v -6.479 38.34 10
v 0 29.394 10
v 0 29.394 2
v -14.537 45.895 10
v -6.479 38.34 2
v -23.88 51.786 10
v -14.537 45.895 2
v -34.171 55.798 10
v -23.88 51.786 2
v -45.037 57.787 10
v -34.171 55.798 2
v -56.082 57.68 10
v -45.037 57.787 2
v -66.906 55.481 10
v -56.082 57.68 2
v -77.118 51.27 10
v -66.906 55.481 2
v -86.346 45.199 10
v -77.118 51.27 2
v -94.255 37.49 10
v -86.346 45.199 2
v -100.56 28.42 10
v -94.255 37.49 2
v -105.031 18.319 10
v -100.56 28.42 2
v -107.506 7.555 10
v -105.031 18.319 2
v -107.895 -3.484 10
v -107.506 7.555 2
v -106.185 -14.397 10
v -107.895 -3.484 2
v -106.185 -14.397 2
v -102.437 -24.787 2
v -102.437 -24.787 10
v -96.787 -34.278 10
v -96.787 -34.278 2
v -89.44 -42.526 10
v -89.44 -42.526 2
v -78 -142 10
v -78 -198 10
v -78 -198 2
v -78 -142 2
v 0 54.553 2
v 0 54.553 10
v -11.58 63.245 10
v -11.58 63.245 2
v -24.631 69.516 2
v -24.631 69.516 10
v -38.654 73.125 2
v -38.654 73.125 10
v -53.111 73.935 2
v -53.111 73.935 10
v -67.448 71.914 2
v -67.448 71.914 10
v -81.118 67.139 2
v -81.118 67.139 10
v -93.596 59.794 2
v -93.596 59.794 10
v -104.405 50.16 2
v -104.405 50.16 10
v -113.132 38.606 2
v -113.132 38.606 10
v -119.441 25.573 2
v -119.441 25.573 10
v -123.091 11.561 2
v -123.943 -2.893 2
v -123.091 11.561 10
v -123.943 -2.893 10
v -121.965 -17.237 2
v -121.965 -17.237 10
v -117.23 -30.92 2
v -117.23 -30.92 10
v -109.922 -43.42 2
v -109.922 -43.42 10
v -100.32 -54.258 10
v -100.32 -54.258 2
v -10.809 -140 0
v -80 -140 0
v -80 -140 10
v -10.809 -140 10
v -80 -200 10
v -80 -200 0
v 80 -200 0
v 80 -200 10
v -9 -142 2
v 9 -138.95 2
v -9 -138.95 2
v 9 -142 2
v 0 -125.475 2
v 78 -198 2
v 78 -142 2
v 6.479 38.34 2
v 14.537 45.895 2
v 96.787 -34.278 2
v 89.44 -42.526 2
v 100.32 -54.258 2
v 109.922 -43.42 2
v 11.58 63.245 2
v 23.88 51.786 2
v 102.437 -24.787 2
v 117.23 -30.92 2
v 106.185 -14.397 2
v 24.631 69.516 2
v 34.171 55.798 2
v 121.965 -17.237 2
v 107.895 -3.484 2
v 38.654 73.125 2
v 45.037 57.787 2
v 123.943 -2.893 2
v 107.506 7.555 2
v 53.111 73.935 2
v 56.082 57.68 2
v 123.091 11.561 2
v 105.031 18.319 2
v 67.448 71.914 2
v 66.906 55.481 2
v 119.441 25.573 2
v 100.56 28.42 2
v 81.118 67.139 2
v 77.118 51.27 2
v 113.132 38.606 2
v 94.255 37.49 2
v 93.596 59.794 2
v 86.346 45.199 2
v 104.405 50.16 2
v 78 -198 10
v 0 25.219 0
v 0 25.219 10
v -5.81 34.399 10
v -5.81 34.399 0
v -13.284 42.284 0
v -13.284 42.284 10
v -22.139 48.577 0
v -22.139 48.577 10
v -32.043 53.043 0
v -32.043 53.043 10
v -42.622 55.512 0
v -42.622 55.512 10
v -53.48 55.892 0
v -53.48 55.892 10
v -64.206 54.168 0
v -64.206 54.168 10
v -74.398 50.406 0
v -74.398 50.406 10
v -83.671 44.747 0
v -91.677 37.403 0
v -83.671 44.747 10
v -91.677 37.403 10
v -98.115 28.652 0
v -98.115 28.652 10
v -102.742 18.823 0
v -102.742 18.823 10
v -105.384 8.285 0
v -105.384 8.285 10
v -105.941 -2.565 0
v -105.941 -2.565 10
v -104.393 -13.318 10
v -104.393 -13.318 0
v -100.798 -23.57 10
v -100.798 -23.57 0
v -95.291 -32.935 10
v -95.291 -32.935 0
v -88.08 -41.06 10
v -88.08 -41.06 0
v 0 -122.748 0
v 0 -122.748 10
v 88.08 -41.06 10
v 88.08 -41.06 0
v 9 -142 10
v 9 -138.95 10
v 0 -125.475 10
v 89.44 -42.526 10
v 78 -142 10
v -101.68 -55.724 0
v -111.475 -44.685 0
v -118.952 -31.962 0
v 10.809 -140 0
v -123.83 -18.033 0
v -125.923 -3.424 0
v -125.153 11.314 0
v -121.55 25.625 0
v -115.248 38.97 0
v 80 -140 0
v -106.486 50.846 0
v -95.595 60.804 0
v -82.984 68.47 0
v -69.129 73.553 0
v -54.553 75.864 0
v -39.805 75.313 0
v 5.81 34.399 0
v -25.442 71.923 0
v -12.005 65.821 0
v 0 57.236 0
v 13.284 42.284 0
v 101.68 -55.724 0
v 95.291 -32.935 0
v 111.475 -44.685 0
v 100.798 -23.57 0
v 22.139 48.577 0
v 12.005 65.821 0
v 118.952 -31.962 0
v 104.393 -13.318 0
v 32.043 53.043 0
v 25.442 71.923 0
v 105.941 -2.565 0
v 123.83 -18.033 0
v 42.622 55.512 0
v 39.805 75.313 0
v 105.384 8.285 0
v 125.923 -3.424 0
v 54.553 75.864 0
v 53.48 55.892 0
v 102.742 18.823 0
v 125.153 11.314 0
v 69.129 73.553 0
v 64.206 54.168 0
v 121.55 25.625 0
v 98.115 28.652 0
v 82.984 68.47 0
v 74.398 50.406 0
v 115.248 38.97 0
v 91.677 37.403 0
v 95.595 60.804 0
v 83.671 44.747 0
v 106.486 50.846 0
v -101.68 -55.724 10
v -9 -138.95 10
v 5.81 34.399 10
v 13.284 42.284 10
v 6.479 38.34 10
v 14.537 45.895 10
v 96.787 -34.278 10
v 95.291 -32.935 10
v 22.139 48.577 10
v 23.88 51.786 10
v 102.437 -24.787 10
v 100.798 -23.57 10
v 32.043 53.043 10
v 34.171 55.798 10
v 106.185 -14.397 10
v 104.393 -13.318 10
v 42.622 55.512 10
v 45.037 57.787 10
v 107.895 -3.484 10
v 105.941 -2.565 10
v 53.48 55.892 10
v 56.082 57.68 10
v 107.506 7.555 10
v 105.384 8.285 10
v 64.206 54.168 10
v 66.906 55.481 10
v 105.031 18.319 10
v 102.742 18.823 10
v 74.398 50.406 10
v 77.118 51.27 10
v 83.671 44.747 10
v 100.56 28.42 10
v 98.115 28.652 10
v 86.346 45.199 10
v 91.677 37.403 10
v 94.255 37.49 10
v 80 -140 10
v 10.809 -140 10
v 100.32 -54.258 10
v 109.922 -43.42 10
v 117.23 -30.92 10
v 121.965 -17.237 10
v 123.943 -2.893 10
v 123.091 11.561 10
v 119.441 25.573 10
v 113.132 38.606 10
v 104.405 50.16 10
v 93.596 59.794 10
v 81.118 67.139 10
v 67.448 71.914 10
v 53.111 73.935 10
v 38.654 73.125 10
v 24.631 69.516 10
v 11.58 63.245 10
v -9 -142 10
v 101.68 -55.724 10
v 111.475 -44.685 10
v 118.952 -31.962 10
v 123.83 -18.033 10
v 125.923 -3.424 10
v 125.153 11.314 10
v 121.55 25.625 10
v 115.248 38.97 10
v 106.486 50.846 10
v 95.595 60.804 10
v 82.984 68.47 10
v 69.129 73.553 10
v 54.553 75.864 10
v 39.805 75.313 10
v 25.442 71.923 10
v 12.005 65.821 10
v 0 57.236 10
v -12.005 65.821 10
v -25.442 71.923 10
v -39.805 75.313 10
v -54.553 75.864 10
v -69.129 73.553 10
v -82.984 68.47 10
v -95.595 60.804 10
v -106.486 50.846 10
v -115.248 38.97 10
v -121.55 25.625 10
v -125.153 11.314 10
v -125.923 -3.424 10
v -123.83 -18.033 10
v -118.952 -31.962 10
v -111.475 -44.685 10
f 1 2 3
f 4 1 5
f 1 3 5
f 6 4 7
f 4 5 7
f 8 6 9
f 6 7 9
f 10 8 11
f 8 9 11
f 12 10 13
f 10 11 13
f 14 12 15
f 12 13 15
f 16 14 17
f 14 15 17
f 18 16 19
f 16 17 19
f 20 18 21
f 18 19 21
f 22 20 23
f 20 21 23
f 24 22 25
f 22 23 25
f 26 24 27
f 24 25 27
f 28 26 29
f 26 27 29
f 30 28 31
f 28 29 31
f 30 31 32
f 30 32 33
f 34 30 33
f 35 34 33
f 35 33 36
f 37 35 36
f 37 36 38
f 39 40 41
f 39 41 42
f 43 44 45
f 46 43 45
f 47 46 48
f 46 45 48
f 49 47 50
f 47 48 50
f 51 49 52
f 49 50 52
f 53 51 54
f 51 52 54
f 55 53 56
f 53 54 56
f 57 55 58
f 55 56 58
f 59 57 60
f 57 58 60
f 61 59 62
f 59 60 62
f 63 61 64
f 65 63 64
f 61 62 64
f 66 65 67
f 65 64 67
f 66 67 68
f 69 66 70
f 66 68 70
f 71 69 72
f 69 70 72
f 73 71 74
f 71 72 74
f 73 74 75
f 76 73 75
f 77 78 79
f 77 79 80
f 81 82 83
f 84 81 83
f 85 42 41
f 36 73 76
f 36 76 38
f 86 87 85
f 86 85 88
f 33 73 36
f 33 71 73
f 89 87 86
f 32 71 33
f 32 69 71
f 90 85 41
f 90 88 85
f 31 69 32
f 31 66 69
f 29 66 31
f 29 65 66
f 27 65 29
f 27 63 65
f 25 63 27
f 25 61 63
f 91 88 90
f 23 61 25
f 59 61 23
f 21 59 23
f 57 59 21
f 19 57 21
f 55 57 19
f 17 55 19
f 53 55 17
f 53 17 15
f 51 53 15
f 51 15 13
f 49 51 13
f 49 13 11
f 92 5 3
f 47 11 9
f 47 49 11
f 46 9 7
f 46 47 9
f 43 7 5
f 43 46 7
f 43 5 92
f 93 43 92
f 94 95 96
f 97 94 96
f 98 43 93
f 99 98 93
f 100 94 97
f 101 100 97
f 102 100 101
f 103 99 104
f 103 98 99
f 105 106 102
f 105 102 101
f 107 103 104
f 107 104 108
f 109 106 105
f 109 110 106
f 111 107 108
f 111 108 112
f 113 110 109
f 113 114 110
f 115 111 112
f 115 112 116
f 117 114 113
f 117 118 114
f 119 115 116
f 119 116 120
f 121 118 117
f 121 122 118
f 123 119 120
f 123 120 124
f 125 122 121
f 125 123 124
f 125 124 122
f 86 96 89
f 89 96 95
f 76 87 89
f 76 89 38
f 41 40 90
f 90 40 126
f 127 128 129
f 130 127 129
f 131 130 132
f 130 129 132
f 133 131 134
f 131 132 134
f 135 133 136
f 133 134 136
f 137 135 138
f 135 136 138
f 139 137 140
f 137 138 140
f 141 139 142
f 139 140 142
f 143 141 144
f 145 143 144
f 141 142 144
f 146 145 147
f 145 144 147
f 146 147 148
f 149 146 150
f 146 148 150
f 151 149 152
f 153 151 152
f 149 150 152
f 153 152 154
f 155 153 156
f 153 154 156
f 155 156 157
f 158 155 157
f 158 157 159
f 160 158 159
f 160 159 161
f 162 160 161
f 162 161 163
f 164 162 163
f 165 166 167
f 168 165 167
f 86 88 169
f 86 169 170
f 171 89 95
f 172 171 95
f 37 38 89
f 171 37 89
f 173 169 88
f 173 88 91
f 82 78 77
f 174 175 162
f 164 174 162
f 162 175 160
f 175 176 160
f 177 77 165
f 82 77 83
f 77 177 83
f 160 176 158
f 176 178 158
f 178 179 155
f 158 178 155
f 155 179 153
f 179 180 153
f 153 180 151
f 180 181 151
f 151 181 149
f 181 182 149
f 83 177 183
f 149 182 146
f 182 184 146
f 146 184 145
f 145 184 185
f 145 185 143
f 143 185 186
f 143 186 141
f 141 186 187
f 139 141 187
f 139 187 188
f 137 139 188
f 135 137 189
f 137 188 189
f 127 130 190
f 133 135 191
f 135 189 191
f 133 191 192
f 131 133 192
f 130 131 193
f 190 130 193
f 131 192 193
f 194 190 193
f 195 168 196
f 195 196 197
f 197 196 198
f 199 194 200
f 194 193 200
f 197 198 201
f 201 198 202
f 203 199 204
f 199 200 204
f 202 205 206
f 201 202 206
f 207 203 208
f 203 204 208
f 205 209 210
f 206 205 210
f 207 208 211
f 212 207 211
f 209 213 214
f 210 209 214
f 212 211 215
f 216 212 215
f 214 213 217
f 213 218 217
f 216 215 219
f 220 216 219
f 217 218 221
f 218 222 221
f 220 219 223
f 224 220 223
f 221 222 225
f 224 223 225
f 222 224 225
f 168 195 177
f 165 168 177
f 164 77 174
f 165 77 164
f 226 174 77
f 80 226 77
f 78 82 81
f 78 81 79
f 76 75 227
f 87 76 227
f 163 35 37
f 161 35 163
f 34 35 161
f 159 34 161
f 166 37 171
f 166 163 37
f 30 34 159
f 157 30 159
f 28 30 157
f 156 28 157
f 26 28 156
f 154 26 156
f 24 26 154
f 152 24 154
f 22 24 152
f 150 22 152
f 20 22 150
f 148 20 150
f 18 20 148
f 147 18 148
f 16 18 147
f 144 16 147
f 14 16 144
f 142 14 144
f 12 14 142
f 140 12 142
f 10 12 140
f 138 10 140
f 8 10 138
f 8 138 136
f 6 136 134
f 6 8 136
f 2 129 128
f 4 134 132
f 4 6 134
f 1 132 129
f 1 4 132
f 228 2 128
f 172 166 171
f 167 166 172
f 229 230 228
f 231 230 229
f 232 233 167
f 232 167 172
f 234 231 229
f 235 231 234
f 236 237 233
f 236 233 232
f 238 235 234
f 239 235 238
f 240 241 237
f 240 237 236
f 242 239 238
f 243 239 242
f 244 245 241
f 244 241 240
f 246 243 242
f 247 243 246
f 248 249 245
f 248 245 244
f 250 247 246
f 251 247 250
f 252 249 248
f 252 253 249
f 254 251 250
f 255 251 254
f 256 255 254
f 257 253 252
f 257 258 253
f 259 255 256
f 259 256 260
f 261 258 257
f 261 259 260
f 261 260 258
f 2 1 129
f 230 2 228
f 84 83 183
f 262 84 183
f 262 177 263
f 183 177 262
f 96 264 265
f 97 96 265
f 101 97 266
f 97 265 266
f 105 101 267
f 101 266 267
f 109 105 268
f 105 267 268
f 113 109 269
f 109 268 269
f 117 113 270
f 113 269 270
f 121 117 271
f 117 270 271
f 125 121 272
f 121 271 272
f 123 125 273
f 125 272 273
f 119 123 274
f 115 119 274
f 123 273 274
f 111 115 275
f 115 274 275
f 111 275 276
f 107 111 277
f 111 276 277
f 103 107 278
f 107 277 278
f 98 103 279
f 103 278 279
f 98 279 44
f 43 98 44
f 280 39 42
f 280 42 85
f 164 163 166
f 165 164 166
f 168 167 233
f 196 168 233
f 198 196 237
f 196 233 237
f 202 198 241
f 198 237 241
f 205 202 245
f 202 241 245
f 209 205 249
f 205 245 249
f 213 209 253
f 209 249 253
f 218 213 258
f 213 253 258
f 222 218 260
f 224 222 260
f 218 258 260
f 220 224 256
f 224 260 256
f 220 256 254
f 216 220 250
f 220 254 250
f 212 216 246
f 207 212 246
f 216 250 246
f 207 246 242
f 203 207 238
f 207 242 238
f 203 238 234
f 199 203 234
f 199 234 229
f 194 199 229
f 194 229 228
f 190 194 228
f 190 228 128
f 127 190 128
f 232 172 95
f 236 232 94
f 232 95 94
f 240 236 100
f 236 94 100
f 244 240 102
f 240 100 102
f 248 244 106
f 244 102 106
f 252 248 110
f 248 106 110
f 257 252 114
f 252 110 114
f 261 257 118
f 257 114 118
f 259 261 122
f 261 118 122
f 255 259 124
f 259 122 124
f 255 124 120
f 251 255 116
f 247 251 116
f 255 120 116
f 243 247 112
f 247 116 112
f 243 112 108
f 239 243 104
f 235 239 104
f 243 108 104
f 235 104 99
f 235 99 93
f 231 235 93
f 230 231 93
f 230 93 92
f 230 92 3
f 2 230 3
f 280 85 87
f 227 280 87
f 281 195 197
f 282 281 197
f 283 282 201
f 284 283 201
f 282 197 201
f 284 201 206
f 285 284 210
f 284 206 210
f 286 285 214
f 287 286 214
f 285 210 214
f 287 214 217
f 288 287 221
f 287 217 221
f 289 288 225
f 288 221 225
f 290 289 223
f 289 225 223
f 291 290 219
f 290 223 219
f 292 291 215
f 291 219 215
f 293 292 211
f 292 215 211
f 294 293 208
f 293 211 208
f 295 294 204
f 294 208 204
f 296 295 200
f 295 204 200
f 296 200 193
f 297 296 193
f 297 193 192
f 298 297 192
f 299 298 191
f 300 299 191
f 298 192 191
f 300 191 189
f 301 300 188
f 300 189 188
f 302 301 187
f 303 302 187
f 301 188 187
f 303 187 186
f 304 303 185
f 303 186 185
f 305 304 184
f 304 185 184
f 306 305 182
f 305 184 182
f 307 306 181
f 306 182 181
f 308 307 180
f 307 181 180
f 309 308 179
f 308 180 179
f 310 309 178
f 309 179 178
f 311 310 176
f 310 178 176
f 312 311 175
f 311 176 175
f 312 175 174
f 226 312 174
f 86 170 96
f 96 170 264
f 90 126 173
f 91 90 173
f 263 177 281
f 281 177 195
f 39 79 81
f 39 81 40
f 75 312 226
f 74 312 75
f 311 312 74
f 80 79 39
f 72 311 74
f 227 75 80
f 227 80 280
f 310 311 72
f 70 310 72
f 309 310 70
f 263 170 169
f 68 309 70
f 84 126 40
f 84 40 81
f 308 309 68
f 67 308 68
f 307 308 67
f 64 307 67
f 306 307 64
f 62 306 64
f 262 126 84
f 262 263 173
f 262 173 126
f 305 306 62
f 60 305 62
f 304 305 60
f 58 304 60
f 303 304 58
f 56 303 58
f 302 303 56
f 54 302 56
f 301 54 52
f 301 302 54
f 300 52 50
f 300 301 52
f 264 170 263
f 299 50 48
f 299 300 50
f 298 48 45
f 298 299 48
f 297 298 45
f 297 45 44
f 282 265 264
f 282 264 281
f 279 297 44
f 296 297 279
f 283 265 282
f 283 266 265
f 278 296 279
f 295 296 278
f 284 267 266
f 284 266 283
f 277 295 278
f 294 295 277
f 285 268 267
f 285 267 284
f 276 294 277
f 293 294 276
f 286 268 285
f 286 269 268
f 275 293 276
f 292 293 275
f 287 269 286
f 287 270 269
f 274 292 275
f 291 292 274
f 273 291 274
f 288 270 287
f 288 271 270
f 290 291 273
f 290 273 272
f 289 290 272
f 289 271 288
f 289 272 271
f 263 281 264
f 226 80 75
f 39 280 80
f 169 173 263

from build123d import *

# Parameters (mm, degrees)
PAD_DEPTH       = 10
POCKET_DEPTH    = 8
PAD001_DEPTH    = 10
POCKET001_DEPTH = 10.001
SKETCH004_W     = 160
SKETCH004_H     = 60
PAD002_DEPTH    = 10
SKETCH005_W     = 156
SKETCH005_H     = 56
POCKET002_DEPTH = 8
SKETCH006_W     = 18
SKETCH006_H     = 12
POCKET003_DEPTH = 8


with BuildPart() as part:
    # Sketch001 → Pad (new body)
    with BuildSketch(Plane.XY):
        with BuildLine():
            ThreePointArc((0, 57.236352), (-106.486482, 50.845622), (-101.68, -55.72412))
            Line((-101.68, -55.72412), (0, -150.0248))
            Line((0, -150.0248), (101.68, -55.72412))
            ThreePointArc((101.68, -55.72412), (106.486482, 50.845622), (0, 57.236352))
        make_face()
    extrude(amount=PAD_DEPTH)

    # Sketch002 → Pocket (cut)
    with BuildSketch(Plane.XY.offset(10)):
        with BuildLine():
            ThreePointArc((0, 54.552727), (-104.405447, 50.160217), (-100.32, -54.257696))
            Line((-100.32, -54.257696), (0, -147.297076))
            Line((0, -147.297076), (100.32, -54.257696))
            ThreePointArc((100.32, -54.257696), (104.405447, 50.160217), (0, 54.552727))
        make_face()
    extrude(amount=-POCKET_DEPTH, mode=Mode.SUBTRACT)

    # Sketch003 → Pad001 (join)
    with BuildSketch(Plane.XY):
        with BuildLine():
            ThreePointArc((0, 29.393877), (-86.345652, 45.199486), (-89.44, -42.526302))
            Line((-89.44, -42.526302), (0, -125.475287))
            Line((0, -125.475287), (89.44, -42.526302))
            ThreePointArc((89.44, -42.526302), (86.345652, 45.199486), (0, 29.393877))
        make_face()
    extrude(amount=PAD001_DEPTH)

    # Sketch → Pocket001 (cut, through all)
    with BuildSketch(Plane.XY.offset(10)):
        with BuildLine():
            ThreePointArc((0, 25.21904), (-83.671135, 44.74656), (-88.08, -41.059878))
            Line((-88.08, -41.059878), (0, -122.747563))
            Line((0, -122.747563), (88.08, -41.059878))
            ThreePointArc((88.08, -41.059878), (83.671135, 44.74656), (0, 25.21904))
        make_face()
    extrude(amount=-POCKET001_DEPTH, mode=Mode.SUBTRACT)

    # Sketch004 → Pad002 (join)
    with BuildSketch(Plane.XY):
        with Locations((0, -170)):
            Rectangle(SKETCH004_W, SKETCH004_H)
    extrude(amount=PAD002_DEPTH)

    # Sketch005 → Pocket002 (cut)
    with BuildSketch(Plane.XY.offset(10)):
        with Locations((0, -170)):
            Rectangle(SKETCH005_W, SKETCH005_H)
    extrude(amount=-POCKET002_DEPTH, mode=Mode.SUBTRACT)

    # Sketch006 → Pocket003 (cut)
    with BuildSketch(Plane.XY.offset(10)):
        with Locations((0, -140.2931)):
            Rectangle(SKETCH006_W, SKETCH006_H)
    extrude(amount=-POCKET003_DEPTH, mode=Mode.SUBTRACT)


solid = part.part
